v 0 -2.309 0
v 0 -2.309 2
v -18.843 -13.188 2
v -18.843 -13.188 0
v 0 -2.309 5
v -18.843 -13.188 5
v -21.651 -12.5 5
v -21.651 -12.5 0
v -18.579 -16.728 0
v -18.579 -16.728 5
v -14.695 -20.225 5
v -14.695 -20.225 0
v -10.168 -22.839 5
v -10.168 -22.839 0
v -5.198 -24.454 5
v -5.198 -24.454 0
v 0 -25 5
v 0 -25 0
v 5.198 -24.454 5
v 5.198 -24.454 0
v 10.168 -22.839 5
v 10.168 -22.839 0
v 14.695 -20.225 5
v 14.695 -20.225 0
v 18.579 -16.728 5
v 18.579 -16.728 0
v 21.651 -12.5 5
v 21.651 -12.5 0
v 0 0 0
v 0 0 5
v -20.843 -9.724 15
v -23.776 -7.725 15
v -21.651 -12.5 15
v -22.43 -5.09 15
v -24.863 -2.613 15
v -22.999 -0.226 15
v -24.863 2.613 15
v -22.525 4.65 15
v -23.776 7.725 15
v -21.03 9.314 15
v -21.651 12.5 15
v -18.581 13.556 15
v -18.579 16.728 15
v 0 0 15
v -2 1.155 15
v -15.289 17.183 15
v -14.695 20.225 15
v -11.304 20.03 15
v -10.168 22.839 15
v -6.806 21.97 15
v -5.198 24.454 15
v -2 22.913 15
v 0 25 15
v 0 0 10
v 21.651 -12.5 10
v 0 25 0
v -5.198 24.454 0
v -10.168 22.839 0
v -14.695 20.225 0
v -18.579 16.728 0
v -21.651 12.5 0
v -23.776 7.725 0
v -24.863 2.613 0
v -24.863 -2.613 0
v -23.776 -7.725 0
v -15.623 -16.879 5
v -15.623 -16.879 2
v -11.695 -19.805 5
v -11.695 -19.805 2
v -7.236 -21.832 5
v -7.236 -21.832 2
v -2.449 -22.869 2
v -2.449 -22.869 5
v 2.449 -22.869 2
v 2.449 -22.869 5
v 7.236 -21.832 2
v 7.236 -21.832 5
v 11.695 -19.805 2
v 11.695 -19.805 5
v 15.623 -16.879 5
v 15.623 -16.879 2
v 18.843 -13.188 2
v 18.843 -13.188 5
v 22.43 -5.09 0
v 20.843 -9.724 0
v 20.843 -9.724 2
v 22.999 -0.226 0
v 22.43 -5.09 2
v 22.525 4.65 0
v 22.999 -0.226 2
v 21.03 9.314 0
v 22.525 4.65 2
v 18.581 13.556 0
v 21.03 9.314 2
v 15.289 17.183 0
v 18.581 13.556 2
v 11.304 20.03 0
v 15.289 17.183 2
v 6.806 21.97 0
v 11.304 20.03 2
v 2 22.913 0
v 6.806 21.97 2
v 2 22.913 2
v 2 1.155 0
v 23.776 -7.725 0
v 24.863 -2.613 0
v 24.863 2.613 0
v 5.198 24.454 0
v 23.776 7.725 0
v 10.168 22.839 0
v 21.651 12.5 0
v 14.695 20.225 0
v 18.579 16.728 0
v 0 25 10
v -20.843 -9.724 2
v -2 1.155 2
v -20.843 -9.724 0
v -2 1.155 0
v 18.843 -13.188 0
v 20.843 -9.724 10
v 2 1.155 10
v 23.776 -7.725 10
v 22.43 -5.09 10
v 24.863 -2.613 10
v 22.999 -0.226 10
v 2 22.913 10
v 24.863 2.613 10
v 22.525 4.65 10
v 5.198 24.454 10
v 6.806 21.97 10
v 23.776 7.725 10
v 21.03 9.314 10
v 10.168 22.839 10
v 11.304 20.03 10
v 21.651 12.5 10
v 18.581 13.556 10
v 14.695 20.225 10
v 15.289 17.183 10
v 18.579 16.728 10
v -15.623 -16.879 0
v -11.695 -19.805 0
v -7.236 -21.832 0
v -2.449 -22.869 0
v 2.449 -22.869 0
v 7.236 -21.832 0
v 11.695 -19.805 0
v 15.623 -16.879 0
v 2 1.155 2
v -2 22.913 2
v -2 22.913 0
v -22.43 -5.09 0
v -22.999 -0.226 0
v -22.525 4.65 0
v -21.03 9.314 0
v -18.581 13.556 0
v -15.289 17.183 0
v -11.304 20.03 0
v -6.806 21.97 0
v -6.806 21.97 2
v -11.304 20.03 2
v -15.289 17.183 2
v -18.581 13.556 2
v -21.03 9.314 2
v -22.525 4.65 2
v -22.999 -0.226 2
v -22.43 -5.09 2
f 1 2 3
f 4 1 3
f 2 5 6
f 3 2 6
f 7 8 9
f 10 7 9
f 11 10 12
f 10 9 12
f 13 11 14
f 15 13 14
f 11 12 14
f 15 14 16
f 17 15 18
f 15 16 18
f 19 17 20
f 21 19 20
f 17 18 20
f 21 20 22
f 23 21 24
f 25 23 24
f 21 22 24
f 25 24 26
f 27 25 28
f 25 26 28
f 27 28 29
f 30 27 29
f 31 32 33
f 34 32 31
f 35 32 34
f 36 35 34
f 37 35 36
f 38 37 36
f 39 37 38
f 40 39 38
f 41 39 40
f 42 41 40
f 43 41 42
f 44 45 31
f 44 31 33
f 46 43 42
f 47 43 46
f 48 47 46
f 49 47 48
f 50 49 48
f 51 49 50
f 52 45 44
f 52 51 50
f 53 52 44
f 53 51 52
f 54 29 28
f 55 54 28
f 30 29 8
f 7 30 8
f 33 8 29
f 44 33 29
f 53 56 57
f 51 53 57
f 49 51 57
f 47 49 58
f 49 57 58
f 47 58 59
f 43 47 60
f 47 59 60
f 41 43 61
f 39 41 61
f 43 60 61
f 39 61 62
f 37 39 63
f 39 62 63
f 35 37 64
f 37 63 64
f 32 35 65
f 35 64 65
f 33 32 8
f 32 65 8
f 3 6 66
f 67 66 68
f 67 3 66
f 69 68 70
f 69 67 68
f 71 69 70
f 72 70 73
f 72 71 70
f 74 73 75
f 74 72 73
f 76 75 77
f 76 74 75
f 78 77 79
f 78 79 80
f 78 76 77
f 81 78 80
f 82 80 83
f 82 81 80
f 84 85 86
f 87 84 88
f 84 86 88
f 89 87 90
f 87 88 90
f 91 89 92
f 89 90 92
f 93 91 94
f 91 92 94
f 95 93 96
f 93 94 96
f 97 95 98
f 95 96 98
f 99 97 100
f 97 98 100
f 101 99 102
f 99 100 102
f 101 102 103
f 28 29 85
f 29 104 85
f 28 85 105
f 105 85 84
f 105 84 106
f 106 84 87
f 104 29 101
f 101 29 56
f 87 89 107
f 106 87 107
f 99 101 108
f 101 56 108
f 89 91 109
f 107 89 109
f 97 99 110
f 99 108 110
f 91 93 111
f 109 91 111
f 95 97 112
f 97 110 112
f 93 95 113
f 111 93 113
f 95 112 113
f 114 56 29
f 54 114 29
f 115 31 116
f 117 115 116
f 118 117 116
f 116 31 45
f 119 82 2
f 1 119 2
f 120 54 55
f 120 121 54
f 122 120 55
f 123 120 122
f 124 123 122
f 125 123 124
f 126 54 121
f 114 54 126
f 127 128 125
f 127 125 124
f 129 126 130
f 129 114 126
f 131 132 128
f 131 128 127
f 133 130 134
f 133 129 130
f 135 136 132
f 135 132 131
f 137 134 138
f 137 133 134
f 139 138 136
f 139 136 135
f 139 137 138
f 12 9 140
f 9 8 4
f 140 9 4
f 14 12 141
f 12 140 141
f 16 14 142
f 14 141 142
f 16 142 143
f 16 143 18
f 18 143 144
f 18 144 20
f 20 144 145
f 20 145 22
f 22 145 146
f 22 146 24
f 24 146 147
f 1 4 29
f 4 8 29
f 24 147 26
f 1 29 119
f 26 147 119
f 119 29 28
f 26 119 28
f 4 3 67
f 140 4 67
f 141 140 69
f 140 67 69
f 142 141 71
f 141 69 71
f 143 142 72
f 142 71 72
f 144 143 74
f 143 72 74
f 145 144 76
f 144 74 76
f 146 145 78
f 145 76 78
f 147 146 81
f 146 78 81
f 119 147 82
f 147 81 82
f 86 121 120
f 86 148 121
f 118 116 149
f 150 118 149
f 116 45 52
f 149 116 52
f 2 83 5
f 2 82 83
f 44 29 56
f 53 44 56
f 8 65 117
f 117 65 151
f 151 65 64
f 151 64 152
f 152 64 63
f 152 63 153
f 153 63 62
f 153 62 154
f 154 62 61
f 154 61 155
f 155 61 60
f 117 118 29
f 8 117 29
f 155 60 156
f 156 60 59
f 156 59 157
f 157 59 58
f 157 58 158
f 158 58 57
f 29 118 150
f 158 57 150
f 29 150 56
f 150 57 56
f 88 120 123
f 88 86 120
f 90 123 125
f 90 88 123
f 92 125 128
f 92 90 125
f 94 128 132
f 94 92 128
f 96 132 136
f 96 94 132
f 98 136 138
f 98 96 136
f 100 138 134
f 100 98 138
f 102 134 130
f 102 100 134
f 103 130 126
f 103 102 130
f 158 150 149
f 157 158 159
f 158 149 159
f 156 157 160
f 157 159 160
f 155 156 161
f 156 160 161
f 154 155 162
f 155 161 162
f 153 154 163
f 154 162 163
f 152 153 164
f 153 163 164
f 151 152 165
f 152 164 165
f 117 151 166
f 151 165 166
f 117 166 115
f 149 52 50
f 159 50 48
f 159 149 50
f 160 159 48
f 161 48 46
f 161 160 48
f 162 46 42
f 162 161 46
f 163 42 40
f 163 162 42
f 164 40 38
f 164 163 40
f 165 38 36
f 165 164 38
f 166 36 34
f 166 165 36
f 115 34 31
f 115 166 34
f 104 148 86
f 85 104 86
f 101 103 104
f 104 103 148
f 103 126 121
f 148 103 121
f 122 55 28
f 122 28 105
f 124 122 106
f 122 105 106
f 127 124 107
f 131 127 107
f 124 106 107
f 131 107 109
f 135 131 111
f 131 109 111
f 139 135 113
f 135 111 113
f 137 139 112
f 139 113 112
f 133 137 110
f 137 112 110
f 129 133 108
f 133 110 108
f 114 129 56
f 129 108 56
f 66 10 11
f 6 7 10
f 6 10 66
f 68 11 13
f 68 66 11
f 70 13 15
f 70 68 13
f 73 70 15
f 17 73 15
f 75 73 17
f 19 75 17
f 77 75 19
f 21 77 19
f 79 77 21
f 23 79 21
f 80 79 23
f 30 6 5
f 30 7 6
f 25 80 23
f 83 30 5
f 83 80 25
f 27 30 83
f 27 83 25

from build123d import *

# Parameters (mm, degrees)
F1_DEPTH = 15
F2_DEPTH = 10
F3_DEPTH = 5
F4_T     = -2
F4_2_T   = -2
F4_3_T   = -2
F5_DEPTH = 25


with BuildPart() as f1:
    # F0 (on Top) → F1 (new body)
    with BuildSketch(Plane.XY):
        with BuildLine():
            Line((0, 0), (0, 25))
            ThreePointArc((0, 25), (-21.6506350946, 12.5), (-21.6506350946, -12.5))
            Line((-21.6506350946, -12.5), (0, 0))
        make_face()
    extrude(amount=F1_DEPTH)

    # F4
    f4_openings = [f1.faces().sort_by_distance(p)[0] for p in [
        (-11.936621, 6.891611, 15),
    ]]
    offset(amount=F4_T, openings=f4_openings)


with BuildPart() as f2:
    # F0 (on Top) → F2 (new body)
    with BuildSketch(Plane.XY):
        with BuildLine():
            ThreePointArc((21.6506350946, -12.5), (24.1481456572, -6.4704761276), (25, 0))
            ThreePointArc((25, 0), (17.6776695297, 17.6776695297), (0, 25))
            Line((0, 25), (0, 0))
            Line((0, 0), (21.6506350946, -12.5))
        make_face()
    extrude(amount=F2_DEPTH)

    # F4#2
    f4_2_openings = [f2.faces().sort_by_distance(p)[0] for p in [
        (11.936621, 6.891611, 10),
    ]]
    offset(amount=F4_2_T, openings=f4_2_openings)


with BuildPart() as f3:
    # F0 (on Top) → F3 (new body)
    with BuildSketch(Plane.XY):
        with BuildLine():
            ThreePointArc((-21.6506350946, -12.5), (0, -25), (21.6506350946, -12.5))
            Line((21.6506350946, -12.5), (0, 0))
            Line((0, 0), (-21.6506350946, -12.5))
        make_face()
    extrude(amount=F3_DEPTH)

    # F4#3
    f4_3_openings = [f3.faces().sort_by_distance(p)[0] for p in [
        (0, -13.783222, 5),
    ]]
    offset(amount=F4_3_T, openings=f4_3_openings)


with BuildPart() as f5_tool:
    # F4_face (on face) → F5 (new body)
    with BuildSketch(Plane(origin=(-11.9733768763, 6.9128323626, 2), x_dir=(1, 0, 0), z_dir=(0, 0, 1))):
        with BuildLine():
            Line((-8.8697579567, -16.6372207924), (9.9733768763, -5.7581318242))
            Line((9.9733768763, -5.7581318242), (9.9733768763, 16.0000461122))
            ThreePointArc((9.9733768763, 16.0000461122), (-7.9452074108, 4.5871676374), (-8.8697579567, -16.6372207924))
        make_face()
        with BuildLine():
            ThreePointArc((32.8165117092, -16.6372207924), (31.8919611633, 4.5871676374), (13.9733768763, 16.0000461122))
            Line((13.9733768763, 16.0000461122), (13.9733768763, -5.7581318242))
            Line((13.9733768763, -5.7581318242), (32.8165117092, -16.6372207924))
        make_face()
        with BuildLine():
            ThreePointArc((-6.8697579567, -20.1013224076), (11.9733768763, -29.9128323626), (30.8165117092, -20.1013224076))
            Line((30.8165117092, -20.1013224076), (11.9733768763, -9.2222334394))
            Line((11.9733768763, -9.2222334394), (-6.8697579567, -20.1013224076))
        make_face()
    extrude(amount=-F5_DEPTH)


with BuildPart() as f1_1:
    add(f1.part)

    # F5: cut by f5_tool
    add(f5_tool.part, mode=Mode.SUBTRACT)


with BuildPart() as f2_1:
    add(f2.part)

    # F5: cut by f5_tool
    add(f5_tool.part, mode=Mode.SUBTRACT)


with BuildPart() as f3_1:
    add(f3.part)

    # F5: cut by f5_tool
    add(f5_tool.part, mode=Mode.SUBTRACT)


solid = Compound([f1_1.part, f2_1.part, f3_1.part])
